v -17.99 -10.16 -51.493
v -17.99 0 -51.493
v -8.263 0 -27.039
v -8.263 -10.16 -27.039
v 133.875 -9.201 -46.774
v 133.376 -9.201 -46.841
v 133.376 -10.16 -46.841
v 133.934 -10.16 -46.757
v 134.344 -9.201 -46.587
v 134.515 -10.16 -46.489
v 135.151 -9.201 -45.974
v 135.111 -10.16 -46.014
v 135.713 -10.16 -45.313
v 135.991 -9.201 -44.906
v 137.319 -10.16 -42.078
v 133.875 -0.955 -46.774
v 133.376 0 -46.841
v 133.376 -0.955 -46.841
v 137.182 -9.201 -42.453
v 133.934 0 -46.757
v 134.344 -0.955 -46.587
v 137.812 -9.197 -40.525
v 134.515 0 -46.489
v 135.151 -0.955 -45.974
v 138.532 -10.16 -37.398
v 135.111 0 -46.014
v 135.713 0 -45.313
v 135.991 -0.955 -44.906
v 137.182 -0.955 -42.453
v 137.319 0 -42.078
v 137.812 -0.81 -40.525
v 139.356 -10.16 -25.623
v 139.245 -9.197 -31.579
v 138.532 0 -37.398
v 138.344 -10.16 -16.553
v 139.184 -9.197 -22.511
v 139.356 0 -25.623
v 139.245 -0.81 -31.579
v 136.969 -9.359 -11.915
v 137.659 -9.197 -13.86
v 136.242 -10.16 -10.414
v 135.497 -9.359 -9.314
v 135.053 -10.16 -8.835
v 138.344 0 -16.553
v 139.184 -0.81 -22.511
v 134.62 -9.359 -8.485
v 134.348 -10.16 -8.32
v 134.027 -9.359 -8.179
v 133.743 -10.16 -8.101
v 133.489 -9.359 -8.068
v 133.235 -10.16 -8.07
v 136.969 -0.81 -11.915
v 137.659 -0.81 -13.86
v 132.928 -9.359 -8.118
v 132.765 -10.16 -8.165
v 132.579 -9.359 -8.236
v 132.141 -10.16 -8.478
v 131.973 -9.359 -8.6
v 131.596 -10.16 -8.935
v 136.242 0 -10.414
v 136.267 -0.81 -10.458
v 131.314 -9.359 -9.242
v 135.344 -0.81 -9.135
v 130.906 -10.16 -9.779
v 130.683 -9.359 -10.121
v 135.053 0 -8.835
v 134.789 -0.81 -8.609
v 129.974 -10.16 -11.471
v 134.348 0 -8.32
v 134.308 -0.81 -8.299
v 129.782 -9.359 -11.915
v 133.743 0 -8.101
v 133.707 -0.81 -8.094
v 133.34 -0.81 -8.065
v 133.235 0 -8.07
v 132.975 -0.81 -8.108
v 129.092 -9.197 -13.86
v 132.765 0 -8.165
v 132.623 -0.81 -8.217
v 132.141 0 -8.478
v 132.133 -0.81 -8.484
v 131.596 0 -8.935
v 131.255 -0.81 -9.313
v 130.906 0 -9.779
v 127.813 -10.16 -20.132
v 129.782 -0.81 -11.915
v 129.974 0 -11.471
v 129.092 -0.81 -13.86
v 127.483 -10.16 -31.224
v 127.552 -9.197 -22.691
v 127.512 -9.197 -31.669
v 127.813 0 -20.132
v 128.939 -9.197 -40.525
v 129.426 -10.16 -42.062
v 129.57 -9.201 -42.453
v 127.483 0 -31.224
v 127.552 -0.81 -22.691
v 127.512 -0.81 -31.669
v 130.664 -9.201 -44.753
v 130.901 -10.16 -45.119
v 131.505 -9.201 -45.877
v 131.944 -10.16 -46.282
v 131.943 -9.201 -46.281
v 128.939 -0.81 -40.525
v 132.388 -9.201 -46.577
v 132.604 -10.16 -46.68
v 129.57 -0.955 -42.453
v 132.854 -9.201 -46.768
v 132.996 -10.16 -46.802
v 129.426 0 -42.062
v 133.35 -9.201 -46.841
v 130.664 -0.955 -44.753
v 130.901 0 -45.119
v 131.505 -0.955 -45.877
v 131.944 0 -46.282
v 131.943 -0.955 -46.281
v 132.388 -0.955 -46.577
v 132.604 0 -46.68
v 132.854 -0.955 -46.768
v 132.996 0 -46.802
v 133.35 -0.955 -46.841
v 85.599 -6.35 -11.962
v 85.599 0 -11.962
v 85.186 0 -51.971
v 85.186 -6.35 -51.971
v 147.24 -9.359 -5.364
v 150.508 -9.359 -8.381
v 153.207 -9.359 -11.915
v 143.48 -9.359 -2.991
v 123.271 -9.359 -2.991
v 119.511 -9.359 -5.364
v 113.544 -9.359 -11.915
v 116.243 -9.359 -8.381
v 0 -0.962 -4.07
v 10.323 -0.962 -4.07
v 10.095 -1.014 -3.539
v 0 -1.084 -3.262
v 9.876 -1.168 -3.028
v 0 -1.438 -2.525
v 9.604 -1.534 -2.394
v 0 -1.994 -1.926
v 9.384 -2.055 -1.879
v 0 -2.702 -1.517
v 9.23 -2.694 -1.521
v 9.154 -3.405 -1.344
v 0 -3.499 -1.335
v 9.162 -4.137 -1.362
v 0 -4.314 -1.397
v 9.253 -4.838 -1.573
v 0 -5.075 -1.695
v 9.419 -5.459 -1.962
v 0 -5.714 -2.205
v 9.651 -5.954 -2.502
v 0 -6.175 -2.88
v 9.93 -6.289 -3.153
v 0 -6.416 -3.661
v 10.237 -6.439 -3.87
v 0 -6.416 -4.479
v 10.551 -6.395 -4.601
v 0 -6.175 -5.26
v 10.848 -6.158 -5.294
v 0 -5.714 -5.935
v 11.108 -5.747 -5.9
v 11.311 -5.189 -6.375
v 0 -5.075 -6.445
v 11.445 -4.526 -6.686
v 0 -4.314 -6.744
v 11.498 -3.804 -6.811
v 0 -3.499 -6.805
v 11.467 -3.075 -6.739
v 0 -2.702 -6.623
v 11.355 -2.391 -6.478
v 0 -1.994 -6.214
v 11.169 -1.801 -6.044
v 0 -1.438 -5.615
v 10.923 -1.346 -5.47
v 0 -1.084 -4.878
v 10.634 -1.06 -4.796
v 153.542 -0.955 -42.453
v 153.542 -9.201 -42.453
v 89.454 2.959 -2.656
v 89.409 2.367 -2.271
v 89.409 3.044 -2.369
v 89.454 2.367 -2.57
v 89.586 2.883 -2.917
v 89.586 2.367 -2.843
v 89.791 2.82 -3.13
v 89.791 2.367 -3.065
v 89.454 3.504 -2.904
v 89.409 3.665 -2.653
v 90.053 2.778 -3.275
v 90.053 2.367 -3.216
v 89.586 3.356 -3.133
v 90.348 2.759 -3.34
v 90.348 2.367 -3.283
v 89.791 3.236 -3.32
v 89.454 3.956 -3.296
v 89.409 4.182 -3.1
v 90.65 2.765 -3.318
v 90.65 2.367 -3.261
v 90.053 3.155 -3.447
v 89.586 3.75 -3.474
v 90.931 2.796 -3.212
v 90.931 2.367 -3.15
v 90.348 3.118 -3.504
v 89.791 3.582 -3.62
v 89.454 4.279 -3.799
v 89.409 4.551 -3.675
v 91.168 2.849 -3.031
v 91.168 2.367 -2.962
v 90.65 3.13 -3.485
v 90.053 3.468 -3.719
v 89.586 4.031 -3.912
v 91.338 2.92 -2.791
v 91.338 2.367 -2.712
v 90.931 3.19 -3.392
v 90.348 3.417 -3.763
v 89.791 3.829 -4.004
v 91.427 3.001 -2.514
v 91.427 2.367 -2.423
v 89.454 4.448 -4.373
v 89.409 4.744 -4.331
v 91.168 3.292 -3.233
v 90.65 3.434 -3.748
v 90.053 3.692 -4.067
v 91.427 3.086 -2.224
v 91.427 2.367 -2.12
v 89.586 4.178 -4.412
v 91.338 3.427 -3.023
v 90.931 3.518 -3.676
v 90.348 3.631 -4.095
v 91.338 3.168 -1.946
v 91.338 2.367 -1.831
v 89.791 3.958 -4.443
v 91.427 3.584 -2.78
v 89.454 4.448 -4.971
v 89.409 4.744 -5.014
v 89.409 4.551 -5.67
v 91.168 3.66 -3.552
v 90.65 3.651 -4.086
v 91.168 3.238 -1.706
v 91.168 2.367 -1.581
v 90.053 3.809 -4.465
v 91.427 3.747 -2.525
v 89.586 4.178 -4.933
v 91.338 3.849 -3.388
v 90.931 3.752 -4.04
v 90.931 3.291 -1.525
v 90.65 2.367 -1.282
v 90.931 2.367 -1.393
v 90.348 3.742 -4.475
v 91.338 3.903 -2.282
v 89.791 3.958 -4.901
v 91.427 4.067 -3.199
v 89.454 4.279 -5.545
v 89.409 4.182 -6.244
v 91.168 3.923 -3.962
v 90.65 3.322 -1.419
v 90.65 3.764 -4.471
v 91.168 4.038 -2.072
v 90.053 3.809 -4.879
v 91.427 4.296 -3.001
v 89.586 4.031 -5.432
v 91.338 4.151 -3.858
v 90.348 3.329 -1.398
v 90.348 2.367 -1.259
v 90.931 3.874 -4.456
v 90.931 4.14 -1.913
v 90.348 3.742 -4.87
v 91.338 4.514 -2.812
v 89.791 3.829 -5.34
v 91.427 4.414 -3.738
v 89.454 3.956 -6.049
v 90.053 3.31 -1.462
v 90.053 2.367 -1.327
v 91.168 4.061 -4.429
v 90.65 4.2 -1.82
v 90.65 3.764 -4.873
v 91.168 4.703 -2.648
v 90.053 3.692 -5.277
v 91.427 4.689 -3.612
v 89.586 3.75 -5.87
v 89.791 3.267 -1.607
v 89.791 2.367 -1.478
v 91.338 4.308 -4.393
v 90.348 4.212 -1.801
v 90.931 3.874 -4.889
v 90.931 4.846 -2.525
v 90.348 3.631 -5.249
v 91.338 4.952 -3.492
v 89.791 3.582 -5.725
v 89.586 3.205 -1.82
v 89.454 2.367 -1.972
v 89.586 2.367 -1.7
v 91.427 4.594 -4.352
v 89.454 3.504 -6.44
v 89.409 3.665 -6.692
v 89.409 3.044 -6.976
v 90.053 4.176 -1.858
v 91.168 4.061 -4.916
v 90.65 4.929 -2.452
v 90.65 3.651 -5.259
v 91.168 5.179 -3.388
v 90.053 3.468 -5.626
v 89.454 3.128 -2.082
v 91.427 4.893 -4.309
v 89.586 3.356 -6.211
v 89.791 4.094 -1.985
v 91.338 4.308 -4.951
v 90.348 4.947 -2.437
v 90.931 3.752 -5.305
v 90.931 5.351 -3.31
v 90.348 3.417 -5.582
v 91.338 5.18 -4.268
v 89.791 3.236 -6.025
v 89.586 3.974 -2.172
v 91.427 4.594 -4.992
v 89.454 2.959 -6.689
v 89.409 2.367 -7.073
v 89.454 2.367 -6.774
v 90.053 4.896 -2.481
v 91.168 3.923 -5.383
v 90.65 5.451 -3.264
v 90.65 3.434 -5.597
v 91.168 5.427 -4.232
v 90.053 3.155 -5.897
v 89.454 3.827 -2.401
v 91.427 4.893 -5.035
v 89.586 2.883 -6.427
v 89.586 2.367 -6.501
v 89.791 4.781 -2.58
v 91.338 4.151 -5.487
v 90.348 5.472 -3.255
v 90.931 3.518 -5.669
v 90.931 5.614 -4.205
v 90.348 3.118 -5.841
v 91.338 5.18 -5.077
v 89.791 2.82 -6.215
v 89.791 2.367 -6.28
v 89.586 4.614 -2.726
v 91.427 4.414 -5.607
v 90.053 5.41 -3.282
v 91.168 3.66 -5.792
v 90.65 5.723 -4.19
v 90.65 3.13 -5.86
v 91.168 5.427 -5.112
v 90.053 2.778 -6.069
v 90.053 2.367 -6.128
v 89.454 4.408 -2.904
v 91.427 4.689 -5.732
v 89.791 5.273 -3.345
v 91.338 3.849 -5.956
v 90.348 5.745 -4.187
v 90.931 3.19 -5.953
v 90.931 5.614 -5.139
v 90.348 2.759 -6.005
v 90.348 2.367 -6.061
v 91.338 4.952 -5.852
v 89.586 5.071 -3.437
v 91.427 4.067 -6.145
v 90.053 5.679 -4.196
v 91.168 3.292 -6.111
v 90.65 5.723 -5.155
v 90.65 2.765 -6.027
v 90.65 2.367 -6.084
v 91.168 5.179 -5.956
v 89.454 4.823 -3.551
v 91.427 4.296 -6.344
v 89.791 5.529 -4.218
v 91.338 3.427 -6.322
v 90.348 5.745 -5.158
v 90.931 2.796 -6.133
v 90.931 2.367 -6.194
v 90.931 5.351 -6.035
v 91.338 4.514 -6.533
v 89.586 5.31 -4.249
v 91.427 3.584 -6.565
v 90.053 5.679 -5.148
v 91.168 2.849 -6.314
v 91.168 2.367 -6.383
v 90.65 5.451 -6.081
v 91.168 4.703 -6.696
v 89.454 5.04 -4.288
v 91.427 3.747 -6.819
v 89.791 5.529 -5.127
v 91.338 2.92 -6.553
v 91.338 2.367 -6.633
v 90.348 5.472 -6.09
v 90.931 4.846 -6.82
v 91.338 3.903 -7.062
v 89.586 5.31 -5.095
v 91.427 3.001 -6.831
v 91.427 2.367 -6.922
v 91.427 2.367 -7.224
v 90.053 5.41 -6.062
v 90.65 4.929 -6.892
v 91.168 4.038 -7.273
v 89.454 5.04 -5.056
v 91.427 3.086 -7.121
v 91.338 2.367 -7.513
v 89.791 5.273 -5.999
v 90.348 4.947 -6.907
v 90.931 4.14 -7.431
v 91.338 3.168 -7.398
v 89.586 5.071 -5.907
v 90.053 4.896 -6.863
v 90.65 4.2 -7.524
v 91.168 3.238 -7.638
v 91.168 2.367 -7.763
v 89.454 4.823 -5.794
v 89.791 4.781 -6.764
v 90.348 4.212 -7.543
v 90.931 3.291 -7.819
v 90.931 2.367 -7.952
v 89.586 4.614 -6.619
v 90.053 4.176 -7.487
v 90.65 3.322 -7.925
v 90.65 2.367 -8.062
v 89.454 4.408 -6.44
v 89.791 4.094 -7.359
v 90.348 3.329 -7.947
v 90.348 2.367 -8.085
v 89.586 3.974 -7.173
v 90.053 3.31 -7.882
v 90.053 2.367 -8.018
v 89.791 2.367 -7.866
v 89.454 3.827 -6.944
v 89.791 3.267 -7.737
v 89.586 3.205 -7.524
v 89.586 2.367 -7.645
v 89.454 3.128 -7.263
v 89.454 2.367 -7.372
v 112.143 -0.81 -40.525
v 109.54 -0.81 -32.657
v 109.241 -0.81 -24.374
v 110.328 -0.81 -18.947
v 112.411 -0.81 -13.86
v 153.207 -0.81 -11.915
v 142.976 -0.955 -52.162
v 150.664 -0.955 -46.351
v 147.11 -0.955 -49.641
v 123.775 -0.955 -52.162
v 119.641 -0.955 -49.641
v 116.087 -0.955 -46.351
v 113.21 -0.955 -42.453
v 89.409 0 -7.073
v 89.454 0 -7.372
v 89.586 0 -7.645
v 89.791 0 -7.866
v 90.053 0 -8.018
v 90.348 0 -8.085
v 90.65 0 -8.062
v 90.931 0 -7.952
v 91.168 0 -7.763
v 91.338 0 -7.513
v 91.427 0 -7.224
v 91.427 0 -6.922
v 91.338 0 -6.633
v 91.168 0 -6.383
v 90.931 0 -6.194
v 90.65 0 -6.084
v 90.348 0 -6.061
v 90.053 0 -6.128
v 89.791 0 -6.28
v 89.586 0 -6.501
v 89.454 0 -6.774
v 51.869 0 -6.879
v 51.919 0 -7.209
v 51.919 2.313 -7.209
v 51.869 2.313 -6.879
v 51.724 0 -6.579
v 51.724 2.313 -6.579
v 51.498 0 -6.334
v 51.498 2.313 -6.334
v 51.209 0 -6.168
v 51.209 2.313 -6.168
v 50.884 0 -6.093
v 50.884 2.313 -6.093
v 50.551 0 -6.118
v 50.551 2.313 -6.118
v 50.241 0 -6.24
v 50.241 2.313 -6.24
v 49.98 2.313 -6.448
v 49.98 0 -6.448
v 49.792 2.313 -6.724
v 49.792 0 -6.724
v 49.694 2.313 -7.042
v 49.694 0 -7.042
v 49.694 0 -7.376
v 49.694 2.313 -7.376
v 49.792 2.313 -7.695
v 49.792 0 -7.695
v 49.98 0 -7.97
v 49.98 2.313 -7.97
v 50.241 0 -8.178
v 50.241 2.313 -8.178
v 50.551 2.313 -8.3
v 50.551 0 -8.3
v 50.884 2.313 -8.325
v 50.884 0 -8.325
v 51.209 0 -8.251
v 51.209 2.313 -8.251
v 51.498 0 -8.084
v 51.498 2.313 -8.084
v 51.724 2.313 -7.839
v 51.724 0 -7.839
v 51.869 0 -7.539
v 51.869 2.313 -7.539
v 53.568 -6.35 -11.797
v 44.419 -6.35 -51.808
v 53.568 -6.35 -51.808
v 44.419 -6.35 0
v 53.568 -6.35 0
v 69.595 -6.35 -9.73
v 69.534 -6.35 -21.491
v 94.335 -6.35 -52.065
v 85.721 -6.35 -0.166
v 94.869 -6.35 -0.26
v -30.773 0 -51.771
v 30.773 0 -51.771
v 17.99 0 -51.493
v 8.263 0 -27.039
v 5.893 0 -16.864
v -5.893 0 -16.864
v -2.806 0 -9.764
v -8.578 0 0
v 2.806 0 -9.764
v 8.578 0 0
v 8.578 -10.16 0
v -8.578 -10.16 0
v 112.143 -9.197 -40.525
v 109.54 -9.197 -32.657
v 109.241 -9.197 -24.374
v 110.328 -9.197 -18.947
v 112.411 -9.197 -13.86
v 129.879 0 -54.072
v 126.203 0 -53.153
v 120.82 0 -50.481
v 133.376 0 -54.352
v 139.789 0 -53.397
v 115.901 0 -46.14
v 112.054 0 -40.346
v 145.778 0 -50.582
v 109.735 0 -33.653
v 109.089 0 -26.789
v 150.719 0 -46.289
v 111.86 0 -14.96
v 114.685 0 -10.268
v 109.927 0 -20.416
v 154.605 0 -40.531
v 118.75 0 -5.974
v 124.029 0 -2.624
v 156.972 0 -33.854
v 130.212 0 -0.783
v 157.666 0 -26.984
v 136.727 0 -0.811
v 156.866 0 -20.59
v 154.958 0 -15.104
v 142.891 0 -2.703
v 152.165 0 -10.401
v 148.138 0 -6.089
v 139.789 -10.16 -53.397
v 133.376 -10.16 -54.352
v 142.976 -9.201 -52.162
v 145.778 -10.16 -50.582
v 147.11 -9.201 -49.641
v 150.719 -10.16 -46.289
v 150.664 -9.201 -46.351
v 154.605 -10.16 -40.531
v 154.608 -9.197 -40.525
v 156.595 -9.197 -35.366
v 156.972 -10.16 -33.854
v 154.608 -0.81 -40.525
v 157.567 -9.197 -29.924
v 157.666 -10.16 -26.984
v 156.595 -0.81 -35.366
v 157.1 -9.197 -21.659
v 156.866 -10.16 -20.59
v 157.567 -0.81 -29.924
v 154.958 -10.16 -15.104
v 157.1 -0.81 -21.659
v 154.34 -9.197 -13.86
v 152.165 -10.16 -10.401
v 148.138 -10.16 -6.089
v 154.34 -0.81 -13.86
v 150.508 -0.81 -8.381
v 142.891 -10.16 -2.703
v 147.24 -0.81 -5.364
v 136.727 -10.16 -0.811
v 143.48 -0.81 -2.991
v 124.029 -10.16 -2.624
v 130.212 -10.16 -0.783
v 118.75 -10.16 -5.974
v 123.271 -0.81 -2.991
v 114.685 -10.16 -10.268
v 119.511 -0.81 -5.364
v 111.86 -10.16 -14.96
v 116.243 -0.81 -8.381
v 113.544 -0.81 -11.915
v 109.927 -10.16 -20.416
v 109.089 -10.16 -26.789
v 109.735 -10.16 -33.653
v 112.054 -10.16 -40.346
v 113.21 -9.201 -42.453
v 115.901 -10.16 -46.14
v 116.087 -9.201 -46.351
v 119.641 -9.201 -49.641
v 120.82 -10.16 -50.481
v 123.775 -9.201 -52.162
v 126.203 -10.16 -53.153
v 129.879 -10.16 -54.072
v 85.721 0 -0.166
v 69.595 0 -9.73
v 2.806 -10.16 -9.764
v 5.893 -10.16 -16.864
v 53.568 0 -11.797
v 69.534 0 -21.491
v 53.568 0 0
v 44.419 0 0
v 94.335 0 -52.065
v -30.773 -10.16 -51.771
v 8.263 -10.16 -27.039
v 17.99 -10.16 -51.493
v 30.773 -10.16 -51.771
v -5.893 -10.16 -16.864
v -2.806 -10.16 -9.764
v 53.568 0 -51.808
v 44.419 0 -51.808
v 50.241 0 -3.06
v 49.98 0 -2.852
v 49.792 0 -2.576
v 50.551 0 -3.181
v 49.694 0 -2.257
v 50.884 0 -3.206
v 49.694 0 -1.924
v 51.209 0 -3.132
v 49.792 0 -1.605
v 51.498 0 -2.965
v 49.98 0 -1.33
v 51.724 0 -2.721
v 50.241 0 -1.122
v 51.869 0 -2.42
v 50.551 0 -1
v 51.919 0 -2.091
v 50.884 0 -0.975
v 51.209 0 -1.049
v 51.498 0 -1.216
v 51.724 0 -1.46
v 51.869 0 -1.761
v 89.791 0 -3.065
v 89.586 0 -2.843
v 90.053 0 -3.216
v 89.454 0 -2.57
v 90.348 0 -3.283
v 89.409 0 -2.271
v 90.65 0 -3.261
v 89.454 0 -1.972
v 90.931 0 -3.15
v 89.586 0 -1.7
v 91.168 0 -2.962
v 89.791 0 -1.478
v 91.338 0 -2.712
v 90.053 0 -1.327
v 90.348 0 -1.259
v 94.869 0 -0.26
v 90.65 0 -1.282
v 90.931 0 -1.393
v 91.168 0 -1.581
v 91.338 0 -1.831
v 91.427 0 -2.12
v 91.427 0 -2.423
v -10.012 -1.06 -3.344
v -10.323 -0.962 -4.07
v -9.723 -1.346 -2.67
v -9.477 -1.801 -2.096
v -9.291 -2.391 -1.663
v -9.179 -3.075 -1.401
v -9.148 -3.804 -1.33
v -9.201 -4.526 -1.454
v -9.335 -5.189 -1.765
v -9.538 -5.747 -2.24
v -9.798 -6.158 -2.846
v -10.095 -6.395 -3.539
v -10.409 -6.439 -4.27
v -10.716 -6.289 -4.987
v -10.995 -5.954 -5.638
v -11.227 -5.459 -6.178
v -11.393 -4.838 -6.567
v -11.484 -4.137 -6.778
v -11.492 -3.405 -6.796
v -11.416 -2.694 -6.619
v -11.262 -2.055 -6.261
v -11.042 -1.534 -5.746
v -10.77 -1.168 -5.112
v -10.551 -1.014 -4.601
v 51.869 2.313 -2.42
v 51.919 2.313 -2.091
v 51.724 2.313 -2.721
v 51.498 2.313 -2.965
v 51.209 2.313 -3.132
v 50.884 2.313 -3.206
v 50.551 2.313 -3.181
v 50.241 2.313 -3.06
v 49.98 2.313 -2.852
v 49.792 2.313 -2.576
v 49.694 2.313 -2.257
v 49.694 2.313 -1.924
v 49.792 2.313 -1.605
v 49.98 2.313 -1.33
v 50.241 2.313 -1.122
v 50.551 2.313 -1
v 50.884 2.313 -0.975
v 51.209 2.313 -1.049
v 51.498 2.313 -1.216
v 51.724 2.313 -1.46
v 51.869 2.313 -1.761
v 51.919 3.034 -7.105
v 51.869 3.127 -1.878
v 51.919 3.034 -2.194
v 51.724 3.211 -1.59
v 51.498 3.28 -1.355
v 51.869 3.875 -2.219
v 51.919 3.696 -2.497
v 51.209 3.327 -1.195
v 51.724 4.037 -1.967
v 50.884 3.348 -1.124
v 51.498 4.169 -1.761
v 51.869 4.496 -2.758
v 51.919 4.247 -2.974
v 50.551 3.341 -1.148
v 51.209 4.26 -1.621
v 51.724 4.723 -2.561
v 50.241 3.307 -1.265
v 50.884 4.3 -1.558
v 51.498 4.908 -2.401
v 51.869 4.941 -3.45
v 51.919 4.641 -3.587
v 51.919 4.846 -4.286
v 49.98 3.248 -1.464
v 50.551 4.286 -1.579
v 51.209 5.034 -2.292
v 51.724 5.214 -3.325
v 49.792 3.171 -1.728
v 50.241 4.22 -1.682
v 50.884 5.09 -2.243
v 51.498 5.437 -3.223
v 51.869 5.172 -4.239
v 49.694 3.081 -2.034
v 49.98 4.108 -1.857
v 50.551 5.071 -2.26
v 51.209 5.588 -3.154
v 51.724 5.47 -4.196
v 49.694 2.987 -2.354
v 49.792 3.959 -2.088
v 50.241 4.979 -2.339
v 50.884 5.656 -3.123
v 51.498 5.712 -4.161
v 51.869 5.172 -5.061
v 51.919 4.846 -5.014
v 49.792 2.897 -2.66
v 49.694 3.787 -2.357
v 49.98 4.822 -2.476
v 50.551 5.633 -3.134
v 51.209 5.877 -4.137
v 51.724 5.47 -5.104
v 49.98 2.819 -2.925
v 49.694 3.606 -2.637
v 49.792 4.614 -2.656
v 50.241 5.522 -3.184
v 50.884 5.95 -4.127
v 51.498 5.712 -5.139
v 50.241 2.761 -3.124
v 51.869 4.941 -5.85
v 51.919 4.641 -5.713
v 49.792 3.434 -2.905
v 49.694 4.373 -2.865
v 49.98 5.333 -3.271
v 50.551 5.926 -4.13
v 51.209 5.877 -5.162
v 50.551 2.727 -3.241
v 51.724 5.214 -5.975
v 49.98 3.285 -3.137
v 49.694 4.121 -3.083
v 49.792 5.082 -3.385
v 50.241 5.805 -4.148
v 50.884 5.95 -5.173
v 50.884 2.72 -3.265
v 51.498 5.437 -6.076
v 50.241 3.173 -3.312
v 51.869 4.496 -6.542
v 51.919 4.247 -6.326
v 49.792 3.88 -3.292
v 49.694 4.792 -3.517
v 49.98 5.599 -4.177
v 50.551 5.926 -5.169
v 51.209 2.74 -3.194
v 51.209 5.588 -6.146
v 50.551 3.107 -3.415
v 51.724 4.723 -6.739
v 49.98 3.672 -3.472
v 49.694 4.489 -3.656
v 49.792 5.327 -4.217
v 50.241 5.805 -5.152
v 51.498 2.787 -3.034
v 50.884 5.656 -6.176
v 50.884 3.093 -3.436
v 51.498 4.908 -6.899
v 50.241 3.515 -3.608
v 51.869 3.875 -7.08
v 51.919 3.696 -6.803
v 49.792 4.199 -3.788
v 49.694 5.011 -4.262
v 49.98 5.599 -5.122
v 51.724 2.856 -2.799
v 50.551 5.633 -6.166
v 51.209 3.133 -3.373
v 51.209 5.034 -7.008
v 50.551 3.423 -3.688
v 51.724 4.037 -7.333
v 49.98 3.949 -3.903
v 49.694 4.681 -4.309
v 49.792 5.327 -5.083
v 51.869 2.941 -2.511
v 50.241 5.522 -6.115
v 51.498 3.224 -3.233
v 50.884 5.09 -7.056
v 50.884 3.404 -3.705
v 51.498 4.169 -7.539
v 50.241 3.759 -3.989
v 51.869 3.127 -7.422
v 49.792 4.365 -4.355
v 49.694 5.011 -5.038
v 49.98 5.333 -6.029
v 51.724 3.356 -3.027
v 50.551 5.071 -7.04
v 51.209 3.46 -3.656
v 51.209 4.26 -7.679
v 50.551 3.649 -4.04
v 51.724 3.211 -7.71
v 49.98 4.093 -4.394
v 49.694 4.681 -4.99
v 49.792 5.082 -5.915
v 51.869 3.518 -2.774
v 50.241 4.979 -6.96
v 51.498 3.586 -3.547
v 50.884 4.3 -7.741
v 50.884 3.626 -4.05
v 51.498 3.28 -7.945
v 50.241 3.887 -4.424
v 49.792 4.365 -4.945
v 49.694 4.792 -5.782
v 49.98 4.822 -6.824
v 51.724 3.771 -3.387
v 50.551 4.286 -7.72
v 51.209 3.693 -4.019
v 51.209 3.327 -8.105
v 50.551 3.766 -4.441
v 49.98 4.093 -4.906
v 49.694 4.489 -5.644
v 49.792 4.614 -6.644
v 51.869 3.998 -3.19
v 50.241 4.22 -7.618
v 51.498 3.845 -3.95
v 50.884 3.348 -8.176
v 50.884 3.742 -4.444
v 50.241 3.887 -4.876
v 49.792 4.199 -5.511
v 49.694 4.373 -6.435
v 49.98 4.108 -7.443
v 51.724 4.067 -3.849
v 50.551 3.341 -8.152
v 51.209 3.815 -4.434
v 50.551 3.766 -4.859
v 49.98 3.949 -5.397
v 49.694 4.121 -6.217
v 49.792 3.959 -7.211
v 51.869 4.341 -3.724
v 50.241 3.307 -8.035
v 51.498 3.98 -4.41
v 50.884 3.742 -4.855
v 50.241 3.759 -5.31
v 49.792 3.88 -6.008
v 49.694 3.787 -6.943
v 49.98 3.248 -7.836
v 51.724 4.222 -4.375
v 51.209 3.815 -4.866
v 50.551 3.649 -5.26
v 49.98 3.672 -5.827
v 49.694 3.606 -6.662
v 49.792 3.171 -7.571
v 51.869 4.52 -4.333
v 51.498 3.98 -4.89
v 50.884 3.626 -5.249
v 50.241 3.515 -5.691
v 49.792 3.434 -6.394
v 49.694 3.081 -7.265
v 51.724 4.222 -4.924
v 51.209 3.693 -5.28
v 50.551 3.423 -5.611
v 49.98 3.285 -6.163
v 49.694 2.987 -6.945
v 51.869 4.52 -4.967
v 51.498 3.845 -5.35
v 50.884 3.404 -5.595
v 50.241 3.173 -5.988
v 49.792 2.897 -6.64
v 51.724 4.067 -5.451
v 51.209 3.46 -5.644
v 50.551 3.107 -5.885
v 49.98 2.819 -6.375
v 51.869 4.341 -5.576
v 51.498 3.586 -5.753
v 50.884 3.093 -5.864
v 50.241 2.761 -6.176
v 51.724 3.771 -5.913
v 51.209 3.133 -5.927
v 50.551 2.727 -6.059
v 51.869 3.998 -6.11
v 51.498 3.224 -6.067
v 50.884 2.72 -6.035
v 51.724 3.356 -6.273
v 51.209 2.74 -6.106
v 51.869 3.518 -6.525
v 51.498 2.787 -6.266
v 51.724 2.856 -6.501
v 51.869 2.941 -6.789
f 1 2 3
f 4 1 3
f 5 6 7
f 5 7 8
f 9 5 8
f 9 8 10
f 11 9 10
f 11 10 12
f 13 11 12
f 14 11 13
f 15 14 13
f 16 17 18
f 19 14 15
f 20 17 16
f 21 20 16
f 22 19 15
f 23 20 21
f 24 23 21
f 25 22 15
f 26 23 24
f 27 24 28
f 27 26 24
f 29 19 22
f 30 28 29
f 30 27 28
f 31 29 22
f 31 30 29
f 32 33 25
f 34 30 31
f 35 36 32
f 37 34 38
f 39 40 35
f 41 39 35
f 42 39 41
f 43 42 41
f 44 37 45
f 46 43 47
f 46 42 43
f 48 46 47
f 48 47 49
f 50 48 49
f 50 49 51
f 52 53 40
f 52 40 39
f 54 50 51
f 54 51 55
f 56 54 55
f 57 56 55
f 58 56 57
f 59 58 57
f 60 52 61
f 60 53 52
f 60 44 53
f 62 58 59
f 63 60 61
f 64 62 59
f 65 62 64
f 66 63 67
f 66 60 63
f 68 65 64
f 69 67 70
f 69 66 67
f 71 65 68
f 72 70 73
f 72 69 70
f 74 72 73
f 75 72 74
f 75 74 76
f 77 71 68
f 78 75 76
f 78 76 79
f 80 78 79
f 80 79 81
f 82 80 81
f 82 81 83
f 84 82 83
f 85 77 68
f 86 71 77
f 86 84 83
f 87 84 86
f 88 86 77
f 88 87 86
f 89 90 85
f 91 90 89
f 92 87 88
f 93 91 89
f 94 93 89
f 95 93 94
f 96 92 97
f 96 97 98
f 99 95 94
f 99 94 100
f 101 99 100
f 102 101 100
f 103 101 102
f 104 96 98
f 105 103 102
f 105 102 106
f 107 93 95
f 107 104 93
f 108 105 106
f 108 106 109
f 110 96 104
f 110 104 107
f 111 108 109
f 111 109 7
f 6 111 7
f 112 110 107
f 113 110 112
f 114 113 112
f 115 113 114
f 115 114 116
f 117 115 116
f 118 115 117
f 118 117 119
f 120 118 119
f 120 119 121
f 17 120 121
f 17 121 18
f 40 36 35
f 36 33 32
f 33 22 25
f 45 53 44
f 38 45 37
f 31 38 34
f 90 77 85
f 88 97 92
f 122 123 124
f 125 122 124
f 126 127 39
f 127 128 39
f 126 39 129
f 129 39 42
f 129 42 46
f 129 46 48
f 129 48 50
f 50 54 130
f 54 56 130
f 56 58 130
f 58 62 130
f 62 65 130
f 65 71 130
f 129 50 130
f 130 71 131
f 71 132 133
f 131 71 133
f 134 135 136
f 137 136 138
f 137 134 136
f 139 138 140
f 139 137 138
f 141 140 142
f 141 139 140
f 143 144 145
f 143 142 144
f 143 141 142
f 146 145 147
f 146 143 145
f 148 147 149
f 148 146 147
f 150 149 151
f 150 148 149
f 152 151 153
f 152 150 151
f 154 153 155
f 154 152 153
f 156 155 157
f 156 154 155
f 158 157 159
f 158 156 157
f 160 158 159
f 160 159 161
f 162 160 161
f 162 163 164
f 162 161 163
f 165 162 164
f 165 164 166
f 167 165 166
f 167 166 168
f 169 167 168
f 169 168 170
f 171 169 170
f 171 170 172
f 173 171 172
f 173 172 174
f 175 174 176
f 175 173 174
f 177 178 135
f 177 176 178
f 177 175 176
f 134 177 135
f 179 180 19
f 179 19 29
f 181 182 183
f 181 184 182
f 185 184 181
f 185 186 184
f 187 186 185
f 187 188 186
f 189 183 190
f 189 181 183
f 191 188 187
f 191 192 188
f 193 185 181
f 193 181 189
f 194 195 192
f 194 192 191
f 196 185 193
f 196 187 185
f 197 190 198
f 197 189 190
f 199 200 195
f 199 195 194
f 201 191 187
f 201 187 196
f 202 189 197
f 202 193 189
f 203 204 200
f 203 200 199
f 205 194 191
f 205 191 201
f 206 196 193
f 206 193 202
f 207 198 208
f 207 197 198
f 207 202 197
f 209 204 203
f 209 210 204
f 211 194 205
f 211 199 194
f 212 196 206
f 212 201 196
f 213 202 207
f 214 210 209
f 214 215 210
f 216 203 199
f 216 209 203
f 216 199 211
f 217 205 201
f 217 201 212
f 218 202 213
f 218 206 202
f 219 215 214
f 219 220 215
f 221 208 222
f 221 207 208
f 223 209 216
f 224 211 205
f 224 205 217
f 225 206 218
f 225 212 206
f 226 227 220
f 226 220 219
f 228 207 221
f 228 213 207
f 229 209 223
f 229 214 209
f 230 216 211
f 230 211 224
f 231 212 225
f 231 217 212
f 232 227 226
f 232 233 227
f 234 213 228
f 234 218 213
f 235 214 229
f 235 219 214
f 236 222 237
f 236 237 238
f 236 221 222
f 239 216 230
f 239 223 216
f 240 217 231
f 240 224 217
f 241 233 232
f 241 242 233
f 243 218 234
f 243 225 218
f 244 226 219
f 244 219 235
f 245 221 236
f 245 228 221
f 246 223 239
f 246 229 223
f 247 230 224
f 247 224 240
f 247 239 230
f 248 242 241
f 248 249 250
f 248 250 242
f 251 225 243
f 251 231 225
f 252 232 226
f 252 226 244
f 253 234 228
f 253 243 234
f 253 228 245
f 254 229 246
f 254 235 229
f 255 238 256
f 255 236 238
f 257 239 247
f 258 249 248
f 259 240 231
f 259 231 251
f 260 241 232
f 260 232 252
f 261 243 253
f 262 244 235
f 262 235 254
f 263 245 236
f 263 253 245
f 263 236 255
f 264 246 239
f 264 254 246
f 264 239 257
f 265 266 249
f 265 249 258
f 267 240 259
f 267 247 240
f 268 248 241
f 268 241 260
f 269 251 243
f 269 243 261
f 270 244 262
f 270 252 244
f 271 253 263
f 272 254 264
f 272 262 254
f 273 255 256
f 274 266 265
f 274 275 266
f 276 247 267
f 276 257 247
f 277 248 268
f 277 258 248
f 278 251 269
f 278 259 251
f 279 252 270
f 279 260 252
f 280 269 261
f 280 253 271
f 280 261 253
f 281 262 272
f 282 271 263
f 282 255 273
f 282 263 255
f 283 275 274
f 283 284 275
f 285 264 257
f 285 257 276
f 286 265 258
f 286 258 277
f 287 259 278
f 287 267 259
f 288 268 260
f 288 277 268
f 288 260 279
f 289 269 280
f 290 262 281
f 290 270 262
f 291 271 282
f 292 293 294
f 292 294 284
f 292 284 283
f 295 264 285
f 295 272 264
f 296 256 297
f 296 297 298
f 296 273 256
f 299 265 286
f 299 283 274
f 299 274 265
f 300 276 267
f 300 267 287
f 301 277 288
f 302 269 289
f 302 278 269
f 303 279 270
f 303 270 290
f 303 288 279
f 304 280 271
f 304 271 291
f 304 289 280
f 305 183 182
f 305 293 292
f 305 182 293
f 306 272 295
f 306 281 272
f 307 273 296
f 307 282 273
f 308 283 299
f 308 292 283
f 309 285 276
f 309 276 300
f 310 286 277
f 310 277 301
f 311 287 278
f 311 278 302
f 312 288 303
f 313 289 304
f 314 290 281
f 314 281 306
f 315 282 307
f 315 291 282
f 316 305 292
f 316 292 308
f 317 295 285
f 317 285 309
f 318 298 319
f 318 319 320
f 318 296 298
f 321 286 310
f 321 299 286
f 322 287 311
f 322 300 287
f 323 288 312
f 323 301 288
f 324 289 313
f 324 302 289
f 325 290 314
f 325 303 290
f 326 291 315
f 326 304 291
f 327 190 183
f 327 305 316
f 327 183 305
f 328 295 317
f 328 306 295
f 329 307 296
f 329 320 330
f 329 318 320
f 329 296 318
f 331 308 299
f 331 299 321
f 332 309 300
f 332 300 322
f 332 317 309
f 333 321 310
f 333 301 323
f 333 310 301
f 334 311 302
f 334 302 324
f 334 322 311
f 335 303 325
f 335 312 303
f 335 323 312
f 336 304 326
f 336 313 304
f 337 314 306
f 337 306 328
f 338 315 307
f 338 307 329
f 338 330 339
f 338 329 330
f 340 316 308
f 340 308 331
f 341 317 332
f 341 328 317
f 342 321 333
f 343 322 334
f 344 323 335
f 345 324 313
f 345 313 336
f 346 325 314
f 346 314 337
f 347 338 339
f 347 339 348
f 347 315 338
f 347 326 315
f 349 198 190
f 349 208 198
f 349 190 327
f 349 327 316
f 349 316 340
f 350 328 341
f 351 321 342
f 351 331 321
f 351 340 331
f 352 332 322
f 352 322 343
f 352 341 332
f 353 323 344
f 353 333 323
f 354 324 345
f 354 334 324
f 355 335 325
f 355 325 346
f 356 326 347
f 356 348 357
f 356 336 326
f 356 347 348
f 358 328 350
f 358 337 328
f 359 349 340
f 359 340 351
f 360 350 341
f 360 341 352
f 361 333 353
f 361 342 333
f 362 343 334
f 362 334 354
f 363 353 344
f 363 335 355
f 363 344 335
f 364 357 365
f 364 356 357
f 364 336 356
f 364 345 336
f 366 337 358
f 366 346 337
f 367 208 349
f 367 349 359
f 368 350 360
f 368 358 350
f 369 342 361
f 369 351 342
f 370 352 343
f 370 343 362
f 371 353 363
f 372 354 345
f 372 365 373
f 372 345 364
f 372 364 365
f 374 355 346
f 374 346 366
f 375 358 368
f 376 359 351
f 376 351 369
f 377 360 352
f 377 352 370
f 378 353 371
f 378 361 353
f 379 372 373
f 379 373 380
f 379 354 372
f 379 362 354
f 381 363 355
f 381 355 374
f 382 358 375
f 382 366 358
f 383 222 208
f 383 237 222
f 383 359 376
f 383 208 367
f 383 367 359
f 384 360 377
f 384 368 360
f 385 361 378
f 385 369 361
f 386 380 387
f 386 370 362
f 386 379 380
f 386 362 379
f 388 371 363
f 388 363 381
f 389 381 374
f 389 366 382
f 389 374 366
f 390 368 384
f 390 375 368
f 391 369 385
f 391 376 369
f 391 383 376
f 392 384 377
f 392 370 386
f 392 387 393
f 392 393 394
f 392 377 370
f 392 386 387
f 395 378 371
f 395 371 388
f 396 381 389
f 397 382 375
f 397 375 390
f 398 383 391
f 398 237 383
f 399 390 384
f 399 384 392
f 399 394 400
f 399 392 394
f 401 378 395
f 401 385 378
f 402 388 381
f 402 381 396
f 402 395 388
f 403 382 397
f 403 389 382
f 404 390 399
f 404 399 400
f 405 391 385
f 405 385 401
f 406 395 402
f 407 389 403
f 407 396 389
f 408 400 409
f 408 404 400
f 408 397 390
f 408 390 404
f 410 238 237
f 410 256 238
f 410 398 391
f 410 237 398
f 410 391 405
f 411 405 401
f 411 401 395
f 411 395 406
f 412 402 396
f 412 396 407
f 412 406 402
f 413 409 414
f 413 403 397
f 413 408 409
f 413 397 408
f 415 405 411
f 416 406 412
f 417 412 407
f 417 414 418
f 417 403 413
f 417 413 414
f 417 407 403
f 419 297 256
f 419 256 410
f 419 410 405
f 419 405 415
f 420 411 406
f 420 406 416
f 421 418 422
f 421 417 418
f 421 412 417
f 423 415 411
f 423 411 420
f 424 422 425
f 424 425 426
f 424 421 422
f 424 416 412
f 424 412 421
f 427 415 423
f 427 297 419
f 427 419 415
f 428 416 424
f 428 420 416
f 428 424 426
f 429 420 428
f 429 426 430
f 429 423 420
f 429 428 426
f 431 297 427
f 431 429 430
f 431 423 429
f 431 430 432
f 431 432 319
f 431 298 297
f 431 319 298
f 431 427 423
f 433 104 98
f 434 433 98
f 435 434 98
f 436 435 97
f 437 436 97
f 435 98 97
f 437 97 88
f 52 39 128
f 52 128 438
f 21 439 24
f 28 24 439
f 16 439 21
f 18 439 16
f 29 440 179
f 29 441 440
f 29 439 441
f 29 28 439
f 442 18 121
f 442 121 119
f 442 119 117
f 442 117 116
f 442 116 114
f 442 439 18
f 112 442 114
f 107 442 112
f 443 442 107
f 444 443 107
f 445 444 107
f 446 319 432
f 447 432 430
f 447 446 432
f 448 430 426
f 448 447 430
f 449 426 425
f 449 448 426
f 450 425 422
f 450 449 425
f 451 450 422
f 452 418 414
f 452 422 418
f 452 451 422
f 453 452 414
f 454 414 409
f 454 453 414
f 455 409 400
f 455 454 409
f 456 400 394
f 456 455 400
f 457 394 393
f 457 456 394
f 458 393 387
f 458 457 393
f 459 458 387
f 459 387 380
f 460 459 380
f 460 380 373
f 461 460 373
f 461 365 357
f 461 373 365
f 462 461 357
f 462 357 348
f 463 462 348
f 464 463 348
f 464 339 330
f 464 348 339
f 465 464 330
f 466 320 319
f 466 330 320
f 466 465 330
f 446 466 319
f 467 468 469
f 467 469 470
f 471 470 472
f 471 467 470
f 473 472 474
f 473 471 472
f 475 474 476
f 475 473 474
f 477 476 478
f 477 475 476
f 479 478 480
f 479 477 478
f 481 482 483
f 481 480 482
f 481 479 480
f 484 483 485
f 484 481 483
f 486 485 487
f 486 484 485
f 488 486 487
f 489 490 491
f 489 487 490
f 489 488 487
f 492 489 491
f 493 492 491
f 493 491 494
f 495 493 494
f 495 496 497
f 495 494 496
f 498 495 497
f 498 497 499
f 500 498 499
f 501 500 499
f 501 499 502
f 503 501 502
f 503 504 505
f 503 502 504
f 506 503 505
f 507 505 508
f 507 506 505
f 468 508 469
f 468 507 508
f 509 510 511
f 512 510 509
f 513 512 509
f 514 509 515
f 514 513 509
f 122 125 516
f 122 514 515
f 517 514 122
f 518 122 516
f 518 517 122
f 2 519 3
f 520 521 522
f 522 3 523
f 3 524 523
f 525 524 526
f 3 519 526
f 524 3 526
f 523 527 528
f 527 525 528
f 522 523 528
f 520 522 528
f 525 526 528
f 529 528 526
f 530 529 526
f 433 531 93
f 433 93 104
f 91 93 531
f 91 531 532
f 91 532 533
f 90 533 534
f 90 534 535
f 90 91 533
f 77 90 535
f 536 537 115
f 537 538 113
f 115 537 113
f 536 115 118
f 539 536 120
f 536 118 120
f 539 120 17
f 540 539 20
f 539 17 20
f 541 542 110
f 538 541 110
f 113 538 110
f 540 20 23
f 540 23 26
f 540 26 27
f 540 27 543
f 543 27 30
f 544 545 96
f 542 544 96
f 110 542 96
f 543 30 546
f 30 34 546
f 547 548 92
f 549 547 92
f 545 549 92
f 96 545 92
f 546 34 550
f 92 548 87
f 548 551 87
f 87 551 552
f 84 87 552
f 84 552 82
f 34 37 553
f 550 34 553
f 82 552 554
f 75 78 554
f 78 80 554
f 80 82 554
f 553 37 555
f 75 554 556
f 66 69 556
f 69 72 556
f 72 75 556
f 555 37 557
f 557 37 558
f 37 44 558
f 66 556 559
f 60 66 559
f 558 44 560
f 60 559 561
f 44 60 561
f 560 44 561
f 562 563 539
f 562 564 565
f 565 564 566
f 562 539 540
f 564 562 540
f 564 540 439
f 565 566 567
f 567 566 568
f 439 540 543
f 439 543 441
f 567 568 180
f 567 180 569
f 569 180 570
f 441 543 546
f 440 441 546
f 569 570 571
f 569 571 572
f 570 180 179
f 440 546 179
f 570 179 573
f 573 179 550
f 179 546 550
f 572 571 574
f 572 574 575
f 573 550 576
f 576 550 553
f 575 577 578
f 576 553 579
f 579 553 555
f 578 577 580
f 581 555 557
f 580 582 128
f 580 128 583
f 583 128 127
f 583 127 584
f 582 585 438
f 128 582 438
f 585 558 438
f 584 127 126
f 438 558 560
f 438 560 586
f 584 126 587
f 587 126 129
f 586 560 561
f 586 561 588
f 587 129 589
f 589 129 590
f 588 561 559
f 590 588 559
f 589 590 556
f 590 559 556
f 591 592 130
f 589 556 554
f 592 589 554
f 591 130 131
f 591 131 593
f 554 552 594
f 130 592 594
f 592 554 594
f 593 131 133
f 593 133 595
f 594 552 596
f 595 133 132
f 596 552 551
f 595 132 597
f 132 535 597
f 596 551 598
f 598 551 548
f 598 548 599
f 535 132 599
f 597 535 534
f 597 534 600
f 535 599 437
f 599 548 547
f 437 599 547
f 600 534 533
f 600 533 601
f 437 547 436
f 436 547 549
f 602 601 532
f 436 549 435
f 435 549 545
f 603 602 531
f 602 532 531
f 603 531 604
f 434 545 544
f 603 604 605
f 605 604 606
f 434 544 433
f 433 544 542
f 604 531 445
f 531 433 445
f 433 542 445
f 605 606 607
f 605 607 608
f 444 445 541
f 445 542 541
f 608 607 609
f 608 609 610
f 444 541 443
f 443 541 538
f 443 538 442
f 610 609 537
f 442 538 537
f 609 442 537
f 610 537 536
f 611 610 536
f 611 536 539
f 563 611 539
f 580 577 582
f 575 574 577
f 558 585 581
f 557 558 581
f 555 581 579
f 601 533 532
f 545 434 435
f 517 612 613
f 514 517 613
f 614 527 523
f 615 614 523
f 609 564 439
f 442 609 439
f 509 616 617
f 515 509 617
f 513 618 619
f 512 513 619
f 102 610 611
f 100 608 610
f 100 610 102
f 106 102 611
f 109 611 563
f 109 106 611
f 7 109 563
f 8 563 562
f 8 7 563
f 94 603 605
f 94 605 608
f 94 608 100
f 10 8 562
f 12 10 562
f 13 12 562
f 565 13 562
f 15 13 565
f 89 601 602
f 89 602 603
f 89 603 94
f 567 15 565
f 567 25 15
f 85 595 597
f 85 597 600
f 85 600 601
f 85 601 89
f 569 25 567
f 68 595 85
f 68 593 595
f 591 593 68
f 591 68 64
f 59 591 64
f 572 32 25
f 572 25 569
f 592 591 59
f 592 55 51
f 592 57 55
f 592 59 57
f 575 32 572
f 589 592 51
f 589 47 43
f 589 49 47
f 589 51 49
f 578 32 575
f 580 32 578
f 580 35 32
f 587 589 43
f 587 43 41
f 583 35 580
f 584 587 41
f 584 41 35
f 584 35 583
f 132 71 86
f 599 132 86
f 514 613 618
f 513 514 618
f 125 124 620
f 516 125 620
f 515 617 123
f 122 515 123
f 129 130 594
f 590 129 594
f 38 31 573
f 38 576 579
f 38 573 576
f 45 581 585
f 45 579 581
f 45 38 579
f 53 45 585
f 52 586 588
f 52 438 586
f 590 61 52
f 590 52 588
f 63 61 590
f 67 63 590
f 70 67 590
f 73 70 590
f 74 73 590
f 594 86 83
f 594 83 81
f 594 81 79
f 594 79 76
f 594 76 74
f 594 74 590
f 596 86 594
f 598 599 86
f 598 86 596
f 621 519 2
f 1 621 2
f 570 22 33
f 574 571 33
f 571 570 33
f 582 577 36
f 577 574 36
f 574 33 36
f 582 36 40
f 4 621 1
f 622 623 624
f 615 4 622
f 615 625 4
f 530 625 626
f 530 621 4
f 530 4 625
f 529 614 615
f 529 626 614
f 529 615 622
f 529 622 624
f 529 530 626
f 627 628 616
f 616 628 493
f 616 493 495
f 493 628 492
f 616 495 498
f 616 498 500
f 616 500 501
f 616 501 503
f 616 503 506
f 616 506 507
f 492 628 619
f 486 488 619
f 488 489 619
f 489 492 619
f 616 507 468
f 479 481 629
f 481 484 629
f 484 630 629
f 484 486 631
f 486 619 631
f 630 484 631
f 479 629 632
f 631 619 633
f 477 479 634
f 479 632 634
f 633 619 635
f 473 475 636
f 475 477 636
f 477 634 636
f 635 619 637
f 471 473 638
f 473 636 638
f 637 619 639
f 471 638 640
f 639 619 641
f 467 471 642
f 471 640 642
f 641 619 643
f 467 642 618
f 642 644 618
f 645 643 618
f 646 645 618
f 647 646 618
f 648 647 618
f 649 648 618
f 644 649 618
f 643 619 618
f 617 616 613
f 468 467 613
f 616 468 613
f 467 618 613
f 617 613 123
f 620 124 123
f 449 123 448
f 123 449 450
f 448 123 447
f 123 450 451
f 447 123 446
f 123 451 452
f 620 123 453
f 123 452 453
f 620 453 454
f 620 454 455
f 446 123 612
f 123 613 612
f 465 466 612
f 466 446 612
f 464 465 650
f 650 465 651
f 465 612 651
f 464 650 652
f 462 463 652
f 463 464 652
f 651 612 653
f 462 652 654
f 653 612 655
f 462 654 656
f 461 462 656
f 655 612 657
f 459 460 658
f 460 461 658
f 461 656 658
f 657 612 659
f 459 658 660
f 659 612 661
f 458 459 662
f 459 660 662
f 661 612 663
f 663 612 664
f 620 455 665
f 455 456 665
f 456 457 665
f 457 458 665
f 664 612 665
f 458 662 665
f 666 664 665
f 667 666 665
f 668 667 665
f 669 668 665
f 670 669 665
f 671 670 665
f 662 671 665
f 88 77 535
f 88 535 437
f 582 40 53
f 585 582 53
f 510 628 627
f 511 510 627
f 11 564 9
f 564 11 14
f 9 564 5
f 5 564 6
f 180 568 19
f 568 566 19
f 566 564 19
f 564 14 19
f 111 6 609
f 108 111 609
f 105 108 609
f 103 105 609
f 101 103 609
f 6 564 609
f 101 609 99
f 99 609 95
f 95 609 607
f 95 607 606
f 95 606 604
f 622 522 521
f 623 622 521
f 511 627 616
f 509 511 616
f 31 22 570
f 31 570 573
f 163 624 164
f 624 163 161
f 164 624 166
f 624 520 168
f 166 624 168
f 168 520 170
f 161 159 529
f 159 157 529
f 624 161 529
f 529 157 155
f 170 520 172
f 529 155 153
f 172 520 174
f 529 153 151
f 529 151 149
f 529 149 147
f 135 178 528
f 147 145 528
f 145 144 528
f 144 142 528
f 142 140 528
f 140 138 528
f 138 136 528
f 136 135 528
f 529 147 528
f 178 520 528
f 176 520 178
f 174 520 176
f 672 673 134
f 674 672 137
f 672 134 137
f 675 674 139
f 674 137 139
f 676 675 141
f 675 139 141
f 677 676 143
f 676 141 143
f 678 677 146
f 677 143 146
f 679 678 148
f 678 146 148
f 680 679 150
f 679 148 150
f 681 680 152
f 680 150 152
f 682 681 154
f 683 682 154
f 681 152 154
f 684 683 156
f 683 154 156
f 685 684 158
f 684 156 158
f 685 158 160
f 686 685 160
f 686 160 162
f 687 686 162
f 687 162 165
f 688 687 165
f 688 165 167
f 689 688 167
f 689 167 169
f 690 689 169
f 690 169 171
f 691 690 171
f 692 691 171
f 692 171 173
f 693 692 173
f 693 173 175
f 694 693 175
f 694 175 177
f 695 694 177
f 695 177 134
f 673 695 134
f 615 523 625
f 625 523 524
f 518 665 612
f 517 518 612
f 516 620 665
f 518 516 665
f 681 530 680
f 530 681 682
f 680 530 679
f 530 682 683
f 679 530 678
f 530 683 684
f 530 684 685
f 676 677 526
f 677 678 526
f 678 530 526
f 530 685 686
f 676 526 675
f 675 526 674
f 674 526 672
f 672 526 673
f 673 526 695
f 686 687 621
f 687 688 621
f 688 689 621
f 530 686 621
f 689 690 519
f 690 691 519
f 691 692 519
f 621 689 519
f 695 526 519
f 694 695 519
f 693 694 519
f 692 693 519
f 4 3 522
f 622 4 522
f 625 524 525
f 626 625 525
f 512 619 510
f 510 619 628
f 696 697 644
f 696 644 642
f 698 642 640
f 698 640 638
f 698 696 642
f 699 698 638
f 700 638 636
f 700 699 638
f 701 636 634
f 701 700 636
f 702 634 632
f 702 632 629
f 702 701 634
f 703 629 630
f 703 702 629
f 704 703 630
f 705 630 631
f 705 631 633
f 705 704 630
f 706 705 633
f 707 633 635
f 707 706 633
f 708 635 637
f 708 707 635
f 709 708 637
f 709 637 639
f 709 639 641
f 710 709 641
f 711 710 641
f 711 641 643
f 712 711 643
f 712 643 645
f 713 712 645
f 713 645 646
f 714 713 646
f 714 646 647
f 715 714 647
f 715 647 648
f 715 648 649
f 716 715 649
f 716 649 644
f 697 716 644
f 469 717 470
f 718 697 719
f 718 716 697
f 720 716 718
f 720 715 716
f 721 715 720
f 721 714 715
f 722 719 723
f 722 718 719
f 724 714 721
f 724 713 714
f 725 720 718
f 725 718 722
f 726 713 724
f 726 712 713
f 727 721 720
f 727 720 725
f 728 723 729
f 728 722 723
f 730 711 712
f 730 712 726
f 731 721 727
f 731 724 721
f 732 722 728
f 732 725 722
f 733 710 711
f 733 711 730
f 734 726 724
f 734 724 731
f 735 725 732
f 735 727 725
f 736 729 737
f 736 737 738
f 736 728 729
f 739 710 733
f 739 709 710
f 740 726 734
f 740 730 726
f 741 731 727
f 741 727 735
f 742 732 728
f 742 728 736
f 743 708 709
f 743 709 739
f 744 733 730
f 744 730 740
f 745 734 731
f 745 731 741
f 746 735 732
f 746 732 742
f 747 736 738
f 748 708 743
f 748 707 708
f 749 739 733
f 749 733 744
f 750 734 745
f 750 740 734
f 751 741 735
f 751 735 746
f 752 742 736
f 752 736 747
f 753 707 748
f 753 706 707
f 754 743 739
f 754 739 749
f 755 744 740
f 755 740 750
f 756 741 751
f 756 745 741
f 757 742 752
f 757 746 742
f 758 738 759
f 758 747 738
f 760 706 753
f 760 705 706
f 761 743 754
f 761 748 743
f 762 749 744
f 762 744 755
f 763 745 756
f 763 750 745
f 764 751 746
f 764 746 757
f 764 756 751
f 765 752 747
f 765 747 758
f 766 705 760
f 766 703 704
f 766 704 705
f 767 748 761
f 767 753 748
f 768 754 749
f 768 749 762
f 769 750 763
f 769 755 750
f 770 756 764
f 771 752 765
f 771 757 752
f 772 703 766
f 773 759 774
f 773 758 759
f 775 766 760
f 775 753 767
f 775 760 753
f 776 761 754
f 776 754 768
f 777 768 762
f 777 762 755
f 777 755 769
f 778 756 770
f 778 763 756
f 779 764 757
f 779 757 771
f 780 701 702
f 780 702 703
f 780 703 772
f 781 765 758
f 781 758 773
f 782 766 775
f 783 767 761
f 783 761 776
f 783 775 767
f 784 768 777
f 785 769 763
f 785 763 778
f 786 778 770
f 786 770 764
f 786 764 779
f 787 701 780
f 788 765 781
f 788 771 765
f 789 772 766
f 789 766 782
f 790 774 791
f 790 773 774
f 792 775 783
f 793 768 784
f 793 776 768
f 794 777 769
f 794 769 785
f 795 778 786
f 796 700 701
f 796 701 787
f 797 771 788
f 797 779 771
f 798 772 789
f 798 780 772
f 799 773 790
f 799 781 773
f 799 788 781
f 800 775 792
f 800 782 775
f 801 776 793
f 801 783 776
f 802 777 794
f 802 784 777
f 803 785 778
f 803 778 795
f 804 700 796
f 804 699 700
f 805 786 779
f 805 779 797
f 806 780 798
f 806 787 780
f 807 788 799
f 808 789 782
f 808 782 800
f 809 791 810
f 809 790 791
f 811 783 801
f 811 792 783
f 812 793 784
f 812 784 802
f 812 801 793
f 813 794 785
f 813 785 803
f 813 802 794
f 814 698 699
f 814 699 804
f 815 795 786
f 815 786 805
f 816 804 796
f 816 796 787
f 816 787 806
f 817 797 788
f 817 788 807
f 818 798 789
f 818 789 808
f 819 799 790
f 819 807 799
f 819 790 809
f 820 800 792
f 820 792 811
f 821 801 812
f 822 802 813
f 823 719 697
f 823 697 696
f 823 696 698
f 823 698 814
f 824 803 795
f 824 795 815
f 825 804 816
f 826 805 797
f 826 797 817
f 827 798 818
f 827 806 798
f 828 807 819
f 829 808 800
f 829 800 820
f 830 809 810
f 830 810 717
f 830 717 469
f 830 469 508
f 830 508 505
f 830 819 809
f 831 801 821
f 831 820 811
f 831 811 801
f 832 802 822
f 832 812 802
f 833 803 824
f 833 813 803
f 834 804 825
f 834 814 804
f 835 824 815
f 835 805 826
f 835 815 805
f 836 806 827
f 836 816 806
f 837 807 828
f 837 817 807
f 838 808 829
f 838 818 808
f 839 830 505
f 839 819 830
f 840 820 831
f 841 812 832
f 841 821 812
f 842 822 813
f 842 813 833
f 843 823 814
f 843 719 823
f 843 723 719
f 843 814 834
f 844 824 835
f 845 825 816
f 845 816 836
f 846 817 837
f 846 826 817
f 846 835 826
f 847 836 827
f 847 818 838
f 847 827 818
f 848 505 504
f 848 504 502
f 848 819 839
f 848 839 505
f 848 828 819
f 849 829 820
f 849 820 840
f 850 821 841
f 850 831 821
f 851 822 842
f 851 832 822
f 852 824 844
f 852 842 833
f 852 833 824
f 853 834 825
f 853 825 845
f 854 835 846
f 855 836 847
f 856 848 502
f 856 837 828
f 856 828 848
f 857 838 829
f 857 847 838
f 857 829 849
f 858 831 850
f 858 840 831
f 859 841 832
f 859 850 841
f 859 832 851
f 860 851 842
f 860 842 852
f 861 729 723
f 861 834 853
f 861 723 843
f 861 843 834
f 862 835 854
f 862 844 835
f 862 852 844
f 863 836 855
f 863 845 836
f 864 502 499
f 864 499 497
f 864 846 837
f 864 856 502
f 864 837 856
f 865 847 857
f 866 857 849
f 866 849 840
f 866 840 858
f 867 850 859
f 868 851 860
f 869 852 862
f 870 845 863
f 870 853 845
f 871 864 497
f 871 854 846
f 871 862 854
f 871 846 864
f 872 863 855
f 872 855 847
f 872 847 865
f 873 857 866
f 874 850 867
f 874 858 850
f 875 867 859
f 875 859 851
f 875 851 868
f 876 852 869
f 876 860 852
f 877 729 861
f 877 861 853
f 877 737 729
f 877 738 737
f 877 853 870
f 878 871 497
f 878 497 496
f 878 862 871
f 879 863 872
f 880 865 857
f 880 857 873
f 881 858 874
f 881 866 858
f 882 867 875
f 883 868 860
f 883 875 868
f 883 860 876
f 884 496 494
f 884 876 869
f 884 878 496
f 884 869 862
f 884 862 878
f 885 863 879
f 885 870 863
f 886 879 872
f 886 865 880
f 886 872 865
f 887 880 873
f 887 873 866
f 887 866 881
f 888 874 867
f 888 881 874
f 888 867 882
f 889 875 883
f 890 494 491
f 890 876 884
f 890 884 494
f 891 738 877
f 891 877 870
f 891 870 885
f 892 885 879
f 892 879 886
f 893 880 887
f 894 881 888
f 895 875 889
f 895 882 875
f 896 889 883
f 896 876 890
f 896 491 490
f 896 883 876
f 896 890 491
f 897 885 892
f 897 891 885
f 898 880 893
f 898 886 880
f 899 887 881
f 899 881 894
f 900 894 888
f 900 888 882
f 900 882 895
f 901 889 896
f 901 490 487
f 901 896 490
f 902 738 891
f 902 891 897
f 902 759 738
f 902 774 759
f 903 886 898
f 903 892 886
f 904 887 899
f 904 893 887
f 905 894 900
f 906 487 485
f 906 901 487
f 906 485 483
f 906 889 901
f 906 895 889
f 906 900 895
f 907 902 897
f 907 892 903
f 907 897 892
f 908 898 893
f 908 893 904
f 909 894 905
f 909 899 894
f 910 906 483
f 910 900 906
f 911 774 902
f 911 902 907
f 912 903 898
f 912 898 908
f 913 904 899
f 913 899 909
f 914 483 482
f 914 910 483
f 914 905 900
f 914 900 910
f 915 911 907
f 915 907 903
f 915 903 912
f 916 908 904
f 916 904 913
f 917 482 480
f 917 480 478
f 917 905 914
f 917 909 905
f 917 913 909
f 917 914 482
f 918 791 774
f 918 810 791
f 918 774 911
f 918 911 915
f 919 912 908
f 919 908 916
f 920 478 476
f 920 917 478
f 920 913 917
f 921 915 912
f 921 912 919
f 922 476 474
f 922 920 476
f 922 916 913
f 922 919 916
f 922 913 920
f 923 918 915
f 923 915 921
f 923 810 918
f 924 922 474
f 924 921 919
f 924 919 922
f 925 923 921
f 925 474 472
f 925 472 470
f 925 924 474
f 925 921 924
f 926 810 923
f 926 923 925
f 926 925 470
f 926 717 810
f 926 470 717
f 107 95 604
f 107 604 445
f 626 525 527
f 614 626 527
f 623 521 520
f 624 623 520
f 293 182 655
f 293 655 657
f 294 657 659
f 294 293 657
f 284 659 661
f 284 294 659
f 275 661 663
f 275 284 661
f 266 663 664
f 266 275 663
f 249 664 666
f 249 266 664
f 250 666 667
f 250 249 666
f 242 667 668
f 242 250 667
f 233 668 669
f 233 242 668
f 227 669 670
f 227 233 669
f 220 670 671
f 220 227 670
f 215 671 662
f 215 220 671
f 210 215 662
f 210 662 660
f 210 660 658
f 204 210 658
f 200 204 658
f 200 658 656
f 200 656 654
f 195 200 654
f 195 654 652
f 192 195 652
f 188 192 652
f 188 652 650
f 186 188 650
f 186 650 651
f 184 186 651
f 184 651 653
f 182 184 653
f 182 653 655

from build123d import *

# Parameters (mm, degrees)
F1_DEPTH       = 10.16
F3_DEPTH       = 6.35
F7_R           = 1.0147763436
F11_R          = 1.1188796437
F14_DEPTH      = 10.16
F16_R          = 2.7422770781
F17_DEPTH      = 25.4
F17_DEPTH_BACK = 25.4
F18_W          = 8.5491519421
F18_H          = 8.9241147507
F18_W_2        = 8.3874454722
F18_H_2        = 26.6651716083
F18_W_3        = 8.2461273414
F18_H_3        = 9.7091495991
F19_DEPTH      = 25.4
F19_DEPTH_BACK = 25.4


with BuildPart() as f1:
    # F0 (on Front) → F1 (new body)
    with BuildSketch(Plane.XZ):
        Polygon((8.5781961679, 0), (-8.5781961679, 0), (-30.7727456093, -51.771376282), (-17.9896689951, -51.4934845269), (-8.263412863, -27.038898319), (8.263412863, -27.038898319), (17.9896689951, -51.4934845269), (30.7727456093, -51.771376282), align=None)
        Polygon((5.8926227503, -16.8640967458), (-5.8926227503, -16.8640967458), (-2.8057238087, -9.7642270848), (2.8057238087, -9.7642270848), align=None, mode=Mode.SUBTRACT)
    extrude(amount=F1_DEPTH)

    # F16 (on Right) → F17 (cut, two sides)
    with BuildSketch(Plane.YZ) as f17_sk:
        with Locations((-3.704237286, -4.0700952522)):
            Circle(F16_R)
    extrude(amount=-F17_DEPTH, mode=Mode.SUBTRACT)
    extrude(f17_sk.sketch, amount=F17_DEPTH_BACK, mode=Mode.SUBTRACT)


with BuildPart() as f3:
    # F2 (on Front) → F3 (new body)
    with BuildSketch(Plane.XZ):
        Polygon((44.4193556905, 0), (44.4193556905, -51.8076792359), (53.5682961345, -51.8076792359), (53.5682961345, -11.7970751484), (69.5341005921, -21.4905999601), (85.5989950273, -11.9621949497), (85.1864927927, -51.9706725682), (94.3349469921, -52.0649965222), (94.86907498, -0.2600707418), (85.7206207805, -0.1657467879), (69.5947253384, -9.7303326959), (53.5682961345, 0), align=None)
    extrude(amount=F3_DEPTH)

    # F8: sweep along a path in F6
    with BuildLine(Plane.YZ.offset(90.424)) as f8_path:
        Line((0, -2.2713777634), (2.3672888055, -2.2713777634))
        ThreePointArc((2.3672888055, -2.2713777634), (4.7681431261, -4.672232084), (2.3672888055, -7.0730864045))
        Line((2.3672888055, -7.0730864045), (0, -7.0730864045))
    # F7 (on face) → F8 (sweep)
    with BuildSketch(Plane(origin=(0, 0, 0), x_dir=(-1, 0, 0), z_dir=(0, 1, 0))):
        with Locations((-90.424, -2.2713777634)):
            Circle(F7_R)
    sweep(path=f8_path.line)

    # F12: sweep along a path in F10
    with BuildLine(Plane.YZ.offset(50.8)) as f12_path:
        Line((0, -2.0906312857), (2.3128504399, -2.0906312857))
        ThreePointArc((2.3128504399, -2.0906312857), (4.8720561899, -4.6498370357), (2.3128504399, -7.2090427857))
        Line((2.3128504399, -7.2090427857), (0, -7.2090427857))
    # F11 (on Front) → F12 (sweep)
    with BuildSketch(Plane.XZ):
        with Locations((50.8, -2.0906312857)):
            Circle(F11_R)
    sweep(path=f12_path.line)


with BuildPart() as f14:
    # F13 (on Front) → F14 (new body)
    with BuildSketch(Plane.XZ):
        with BuildLine():
            add(Edge.make_bspline(
                [(133.3755403757, -54.3517478871), (175.4543827327, -54.3517478871), (154.4149615542, -14.0031087613), (133.3755403757, 26.3455303645), (112.3361191972, -14.0031087613), (91.2966980187, -54.3517478871), (133.3755403757, -54.3517478871)],
                knots=[0, 0, 0, 2.0943951024, 2.0943951024, 4.1887902048, 4.1887902048, 6.2831853072, 6.2831853072, 6.2831853072], degree=2, weights=[1, 0.5, 1, 0.5, 1, 0.5, 1]))
        make_face()
        with BuildLine():
            add(Edge.make_bspline(
                [(133.3755403757, -46.8408575095), (143.780368723, -46.8408575095), (138.5779545494, -17.7585539501), (133.3755403757, 11.3237496093), (128.173126202, -17.7585539501), (122.9707120284, -46.8408575095), (133.3755403757, -46.8408575095)],
                knots=[0, 0, 0, 2.0943951024, 2.0943951024, 4.1887902048, 4.1887902048, 6.2831853072, 6.2831853072, 6.2831853072], degree=2, weights=[1, 0.5, 1, 0.5, 1, 0.5, 1]))
        make_face(mode=Mode.SUBTRACT)
    extrude(amount=F14_DEPTH)

    # F18 (on offset) → F19 (cut, two sides)
    with BuildSketch(Plane.YZ.offset(133.35)) as f19_sk:
        with Locations((-5.0842342898, -7.4528319528)):
            Rectangle(F18_W, F18_H)
        with Locations((-5.0033810548, -27.192206122)):
            Rectangle(F18_W_2, F18_H_2)
        with Locations((-5.0781696045, -47.3076552153)):
            Rectangle(F18_W_3, F18_H_3)
    extrude(amount=-F19_DEPTH, mode=Mode.SUBTRACT)
    extrude(f19_sk.sketch, amount=F19_DEPTH_BACK, mode=Mode.SUBTRACT)


solid = Compound([f1.part, f3.part, f14.part])
